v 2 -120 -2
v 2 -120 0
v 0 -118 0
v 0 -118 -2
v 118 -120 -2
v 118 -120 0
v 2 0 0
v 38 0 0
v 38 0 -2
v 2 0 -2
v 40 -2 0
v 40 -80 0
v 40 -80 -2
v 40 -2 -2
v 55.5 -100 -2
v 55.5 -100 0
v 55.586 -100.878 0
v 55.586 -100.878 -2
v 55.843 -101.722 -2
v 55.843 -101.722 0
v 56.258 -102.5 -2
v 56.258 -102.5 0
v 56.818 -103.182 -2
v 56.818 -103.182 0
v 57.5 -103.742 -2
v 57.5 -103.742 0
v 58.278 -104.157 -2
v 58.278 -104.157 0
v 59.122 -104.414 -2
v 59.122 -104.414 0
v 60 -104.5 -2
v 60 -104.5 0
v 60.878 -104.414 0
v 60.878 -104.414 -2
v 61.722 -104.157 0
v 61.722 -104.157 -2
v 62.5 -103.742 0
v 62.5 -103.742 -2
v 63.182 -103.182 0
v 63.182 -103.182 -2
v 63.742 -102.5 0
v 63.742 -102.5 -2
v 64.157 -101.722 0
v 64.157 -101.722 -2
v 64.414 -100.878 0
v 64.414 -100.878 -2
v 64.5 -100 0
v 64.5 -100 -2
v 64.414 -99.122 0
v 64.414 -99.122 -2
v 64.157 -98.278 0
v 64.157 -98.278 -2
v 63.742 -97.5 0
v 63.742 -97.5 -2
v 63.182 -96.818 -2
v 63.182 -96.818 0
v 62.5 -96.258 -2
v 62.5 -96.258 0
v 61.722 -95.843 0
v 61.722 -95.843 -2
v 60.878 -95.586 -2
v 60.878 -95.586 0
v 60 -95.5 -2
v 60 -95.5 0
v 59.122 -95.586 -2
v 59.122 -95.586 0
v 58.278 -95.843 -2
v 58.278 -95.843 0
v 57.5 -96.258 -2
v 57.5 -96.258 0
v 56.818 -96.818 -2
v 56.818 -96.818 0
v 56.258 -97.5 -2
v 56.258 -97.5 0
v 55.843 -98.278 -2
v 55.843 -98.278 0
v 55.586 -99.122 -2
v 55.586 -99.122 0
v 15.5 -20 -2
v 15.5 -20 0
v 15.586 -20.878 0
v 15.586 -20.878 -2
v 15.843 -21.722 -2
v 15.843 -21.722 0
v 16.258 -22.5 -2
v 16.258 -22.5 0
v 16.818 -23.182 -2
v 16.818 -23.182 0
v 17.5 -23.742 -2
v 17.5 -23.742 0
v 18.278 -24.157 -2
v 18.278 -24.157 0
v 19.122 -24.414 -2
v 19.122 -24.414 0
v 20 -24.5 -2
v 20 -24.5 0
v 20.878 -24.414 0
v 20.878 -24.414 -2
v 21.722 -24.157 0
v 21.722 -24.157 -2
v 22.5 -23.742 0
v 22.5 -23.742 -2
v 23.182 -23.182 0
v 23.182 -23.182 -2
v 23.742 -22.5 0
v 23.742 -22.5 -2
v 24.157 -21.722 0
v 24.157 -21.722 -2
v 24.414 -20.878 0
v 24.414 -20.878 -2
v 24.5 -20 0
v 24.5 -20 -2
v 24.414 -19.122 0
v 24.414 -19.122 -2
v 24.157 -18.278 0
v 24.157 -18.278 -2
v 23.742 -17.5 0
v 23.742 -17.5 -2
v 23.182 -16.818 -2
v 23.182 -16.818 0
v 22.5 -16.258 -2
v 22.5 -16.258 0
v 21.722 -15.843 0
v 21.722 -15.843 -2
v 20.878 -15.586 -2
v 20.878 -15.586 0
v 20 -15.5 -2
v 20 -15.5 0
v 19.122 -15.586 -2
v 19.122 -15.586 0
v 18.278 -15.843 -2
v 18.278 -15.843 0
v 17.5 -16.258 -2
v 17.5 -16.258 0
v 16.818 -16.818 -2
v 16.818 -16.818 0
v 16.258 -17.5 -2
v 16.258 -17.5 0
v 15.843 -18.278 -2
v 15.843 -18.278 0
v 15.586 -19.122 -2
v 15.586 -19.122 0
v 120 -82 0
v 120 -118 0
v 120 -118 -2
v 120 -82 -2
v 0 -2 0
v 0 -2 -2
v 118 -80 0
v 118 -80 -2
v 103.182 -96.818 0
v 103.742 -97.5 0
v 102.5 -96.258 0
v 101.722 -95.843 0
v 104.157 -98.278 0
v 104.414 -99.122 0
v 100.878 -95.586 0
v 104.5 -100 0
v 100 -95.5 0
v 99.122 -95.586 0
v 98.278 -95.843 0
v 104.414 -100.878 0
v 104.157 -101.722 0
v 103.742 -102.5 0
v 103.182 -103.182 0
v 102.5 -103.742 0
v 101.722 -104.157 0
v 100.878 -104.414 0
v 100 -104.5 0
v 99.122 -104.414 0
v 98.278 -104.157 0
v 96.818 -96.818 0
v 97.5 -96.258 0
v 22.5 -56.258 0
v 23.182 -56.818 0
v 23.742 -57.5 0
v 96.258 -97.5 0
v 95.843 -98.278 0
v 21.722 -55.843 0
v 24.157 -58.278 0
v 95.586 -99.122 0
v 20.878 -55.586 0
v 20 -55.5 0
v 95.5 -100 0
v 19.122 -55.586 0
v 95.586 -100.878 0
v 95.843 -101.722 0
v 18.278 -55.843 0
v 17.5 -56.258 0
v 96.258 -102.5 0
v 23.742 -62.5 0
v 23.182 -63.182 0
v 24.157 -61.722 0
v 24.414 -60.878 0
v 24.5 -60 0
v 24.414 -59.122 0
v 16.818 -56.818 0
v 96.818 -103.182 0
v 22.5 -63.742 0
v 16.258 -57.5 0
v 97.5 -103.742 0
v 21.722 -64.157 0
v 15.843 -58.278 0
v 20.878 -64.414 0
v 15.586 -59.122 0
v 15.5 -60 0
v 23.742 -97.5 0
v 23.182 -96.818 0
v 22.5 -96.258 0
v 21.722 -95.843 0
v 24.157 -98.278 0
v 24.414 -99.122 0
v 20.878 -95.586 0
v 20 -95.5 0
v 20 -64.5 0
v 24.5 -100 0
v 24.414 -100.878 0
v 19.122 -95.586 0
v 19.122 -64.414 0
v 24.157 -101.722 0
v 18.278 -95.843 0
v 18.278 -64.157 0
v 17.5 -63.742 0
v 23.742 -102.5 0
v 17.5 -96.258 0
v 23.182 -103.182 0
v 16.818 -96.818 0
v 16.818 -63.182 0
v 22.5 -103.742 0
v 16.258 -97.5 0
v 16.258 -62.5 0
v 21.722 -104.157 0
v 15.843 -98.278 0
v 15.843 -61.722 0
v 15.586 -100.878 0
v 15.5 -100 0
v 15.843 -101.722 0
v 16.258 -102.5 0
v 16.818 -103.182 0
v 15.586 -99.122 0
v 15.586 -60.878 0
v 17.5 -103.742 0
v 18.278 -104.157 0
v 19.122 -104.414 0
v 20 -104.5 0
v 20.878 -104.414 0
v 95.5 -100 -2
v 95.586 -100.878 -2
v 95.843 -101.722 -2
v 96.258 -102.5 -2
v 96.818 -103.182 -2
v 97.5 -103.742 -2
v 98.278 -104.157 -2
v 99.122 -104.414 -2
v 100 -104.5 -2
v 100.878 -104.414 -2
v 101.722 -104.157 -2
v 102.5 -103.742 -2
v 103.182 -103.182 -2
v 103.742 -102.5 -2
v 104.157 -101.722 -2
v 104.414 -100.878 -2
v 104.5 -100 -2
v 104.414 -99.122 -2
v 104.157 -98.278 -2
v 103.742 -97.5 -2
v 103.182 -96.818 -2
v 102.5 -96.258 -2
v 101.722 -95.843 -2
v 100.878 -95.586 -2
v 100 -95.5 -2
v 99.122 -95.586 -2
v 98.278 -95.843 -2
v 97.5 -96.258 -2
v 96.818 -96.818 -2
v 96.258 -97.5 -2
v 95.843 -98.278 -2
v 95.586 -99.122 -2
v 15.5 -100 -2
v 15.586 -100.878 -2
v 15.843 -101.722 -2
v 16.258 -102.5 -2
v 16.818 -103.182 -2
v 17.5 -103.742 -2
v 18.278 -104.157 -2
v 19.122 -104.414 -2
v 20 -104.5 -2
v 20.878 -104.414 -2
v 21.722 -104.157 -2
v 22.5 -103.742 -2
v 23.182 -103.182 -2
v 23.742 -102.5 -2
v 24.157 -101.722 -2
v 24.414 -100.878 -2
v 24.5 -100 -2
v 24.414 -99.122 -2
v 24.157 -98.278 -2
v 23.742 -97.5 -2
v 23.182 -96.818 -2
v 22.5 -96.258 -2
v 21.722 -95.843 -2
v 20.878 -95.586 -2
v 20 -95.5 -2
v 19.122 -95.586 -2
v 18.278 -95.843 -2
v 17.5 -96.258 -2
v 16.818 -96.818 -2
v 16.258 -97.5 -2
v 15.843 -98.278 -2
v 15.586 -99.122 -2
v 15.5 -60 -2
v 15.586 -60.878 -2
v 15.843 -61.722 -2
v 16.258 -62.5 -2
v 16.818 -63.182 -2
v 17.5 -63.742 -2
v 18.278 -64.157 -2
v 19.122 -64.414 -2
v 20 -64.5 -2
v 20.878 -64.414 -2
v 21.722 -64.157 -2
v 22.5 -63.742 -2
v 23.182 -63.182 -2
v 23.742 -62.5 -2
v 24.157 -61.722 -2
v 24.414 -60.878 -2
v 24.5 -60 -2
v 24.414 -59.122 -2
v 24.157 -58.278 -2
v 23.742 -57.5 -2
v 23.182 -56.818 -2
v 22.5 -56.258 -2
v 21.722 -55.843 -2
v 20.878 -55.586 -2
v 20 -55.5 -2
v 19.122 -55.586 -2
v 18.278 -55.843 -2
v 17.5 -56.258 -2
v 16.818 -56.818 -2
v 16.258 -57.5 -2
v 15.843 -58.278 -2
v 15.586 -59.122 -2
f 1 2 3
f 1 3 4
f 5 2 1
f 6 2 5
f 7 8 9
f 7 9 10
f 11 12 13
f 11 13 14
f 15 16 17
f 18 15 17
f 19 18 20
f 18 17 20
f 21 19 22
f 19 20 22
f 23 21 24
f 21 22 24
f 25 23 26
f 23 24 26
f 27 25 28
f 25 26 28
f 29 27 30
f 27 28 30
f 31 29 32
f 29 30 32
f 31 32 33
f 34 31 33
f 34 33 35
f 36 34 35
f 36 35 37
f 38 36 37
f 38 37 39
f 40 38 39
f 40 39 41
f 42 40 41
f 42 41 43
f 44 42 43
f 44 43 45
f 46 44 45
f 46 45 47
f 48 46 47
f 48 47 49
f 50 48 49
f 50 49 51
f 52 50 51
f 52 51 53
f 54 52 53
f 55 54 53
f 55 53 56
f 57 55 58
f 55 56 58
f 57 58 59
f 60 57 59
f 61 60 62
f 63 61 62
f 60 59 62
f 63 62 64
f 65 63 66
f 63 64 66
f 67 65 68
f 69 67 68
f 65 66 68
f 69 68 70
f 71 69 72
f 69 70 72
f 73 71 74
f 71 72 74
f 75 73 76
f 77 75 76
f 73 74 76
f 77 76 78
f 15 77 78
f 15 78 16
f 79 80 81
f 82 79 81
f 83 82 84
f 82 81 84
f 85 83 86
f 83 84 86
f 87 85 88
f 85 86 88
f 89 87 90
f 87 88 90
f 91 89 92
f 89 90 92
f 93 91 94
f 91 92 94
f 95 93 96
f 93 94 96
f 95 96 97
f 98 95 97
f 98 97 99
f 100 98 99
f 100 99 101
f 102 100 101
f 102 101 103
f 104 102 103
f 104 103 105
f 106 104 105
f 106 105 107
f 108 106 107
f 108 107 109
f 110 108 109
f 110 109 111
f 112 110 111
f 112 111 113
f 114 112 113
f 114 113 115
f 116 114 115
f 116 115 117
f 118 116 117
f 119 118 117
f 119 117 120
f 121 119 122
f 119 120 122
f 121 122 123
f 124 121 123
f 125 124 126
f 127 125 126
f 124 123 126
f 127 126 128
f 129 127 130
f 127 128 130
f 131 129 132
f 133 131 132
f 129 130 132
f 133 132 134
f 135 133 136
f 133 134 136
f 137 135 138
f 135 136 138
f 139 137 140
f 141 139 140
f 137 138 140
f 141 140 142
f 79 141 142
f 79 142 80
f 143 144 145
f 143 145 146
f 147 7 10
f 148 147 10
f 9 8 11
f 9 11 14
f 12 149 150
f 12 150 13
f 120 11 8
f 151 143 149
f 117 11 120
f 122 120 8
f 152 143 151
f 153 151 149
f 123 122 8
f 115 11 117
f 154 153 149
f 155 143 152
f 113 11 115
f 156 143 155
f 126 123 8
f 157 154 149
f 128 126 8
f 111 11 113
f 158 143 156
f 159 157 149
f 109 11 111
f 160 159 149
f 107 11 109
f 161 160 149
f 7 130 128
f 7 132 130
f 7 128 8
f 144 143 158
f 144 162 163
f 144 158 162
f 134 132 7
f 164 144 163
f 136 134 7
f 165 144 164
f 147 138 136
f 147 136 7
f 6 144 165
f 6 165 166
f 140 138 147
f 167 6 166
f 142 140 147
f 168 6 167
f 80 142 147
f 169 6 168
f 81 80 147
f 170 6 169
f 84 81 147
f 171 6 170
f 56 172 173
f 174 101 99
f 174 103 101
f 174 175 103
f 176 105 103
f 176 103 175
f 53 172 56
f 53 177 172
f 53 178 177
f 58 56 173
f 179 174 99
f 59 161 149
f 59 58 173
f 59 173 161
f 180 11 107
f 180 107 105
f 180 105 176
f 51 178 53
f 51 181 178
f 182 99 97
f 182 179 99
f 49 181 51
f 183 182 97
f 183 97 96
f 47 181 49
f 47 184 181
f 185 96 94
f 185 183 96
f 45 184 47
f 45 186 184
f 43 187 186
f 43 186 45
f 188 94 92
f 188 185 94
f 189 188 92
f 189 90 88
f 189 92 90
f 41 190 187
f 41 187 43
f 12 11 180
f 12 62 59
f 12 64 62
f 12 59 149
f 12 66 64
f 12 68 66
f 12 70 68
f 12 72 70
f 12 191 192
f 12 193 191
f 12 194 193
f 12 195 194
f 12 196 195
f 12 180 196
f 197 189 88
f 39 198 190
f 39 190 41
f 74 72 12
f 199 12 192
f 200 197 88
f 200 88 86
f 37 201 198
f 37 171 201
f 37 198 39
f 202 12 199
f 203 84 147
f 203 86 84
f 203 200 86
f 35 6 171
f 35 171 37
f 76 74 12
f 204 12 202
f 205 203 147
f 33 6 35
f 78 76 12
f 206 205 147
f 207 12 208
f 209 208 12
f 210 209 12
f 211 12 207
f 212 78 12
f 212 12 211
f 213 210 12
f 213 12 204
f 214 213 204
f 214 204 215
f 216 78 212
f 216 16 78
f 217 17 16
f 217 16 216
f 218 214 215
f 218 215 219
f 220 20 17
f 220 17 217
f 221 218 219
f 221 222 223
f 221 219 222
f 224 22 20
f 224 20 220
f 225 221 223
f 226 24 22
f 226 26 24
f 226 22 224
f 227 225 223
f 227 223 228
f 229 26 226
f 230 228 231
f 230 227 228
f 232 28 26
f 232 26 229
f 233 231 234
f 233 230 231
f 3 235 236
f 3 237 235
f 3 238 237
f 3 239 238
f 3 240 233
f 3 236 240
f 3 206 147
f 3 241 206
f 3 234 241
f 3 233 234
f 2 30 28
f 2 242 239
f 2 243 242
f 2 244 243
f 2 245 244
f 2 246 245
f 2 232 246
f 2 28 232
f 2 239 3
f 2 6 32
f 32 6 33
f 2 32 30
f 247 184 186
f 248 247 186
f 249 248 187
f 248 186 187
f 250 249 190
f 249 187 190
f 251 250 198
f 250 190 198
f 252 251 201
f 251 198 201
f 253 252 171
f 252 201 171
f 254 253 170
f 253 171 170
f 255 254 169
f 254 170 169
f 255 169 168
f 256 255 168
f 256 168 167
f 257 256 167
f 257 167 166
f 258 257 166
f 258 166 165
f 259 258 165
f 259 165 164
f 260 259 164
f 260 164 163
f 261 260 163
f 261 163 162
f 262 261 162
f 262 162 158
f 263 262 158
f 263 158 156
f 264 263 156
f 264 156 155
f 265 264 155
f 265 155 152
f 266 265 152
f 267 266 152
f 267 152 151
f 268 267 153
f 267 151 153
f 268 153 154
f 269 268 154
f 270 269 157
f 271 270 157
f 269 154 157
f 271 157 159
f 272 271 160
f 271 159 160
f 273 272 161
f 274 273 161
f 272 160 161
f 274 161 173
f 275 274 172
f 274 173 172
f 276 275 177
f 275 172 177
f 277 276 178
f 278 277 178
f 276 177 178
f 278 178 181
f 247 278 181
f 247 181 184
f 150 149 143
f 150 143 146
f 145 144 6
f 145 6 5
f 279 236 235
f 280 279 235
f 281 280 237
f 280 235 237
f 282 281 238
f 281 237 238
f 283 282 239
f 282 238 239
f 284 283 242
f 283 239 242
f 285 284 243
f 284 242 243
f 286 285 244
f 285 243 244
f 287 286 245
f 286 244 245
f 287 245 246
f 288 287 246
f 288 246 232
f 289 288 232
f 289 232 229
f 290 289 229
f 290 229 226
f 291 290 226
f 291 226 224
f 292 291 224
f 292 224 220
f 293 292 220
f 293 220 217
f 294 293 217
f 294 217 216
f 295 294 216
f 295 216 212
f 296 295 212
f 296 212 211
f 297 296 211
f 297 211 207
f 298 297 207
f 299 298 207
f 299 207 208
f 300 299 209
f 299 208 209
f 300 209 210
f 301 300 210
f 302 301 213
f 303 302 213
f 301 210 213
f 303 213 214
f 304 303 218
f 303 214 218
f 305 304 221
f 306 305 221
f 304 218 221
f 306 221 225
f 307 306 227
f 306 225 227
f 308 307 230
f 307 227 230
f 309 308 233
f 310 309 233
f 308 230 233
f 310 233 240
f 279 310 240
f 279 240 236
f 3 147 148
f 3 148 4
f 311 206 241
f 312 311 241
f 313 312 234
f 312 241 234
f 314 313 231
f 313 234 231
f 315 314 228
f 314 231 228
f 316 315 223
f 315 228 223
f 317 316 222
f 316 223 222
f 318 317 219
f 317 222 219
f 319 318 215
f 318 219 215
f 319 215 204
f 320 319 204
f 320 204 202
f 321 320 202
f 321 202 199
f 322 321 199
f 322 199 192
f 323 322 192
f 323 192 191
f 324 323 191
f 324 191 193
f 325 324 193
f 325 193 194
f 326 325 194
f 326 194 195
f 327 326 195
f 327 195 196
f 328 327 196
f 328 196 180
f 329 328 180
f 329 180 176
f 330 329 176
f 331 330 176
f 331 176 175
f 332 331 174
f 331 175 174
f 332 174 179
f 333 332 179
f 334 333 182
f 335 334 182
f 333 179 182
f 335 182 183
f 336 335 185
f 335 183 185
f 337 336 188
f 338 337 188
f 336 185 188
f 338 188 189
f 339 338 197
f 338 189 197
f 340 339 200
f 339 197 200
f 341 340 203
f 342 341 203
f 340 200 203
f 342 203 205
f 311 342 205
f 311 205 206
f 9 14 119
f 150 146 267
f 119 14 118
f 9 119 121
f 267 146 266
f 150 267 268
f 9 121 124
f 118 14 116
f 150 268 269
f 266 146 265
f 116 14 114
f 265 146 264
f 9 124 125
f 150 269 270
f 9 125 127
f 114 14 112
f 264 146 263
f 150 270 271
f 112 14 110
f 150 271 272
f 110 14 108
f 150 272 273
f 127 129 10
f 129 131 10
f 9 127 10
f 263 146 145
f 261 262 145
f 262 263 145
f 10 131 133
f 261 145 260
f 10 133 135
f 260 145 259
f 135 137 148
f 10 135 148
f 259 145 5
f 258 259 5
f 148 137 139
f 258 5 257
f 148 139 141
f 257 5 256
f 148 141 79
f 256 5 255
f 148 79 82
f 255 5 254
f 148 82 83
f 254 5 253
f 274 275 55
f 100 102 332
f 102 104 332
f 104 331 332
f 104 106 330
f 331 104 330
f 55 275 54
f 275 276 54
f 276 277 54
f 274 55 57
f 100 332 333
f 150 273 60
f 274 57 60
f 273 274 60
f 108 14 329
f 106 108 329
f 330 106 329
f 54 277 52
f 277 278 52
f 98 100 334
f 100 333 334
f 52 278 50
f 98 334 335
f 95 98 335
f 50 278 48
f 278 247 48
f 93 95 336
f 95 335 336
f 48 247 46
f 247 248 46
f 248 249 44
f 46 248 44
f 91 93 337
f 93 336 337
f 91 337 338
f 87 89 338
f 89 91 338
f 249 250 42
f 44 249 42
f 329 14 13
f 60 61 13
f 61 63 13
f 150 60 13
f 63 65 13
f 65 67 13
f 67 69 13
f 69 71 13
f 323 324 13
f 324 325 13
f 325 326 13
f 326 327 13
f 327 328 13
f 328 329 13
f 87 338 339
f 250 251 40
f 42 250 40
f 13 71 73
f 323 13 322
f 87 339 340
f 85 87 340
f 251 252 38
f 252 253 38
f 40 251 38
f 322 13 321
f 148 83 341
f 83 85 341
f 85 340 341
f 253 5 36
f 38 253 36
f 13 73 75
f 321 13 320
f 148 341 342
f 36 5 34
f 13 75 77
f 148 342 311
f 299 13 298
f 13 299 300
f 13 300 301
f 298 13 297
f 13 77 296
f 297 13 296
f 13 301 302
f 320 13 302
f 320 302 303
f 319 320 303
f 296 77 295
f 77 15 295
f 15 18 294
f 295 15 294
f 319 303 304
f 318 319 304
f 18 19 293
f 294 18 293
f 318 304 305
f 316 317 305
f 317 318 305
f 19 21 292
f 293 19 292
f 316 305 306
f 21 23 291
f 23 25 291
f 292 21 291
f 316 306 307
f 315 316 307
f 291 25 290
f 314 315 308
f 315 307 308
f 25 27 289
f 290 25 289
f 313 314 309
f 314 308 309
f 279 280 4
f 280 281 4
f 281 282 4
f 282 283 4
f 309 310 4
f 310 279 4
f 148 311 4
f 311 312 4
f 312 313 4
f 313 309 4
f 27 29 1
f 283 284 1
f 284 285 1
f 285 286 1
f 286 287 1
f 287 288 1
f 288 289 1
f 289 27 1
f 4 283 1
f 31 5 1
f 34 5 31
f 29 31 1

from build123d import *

# Parameters (mm, degrees)
EXTRUDE_1_DEPTH   = 2
HOLE_WIZARD_M81_D = 9
CHAMFER_1_SIZE    = 2


with BuildPart() as part:
    # Эскиз1 → Бобышка-Вытянуть1 (new body)
    with BuildSketch(Plane(origin=(0, 0, 0), x_dir=(1, 0, 0), z_dir=(0, 0, -1))):
        Polygon((0, 0), (0, 120), (120, 120), (120, 80), (40, 80), (40, 0), align=None)
    extrude(amount=EXTRUDE_1_DEPTH)

    # Отверстие с зазором M81 (through all)
    with Locations(Plane(origin=(0, 0, -2), x_dir=(1, 0, 0), z_dir=(0, 0, -1))):
        with Locations((60, 100), (20, 100), (20, 60), (20, 20), (100, 100)):
            Hole(HOLE_WIZARD_M81_D / 2)

    # Фаска1
    chamfer_1_edges = [part.edges().sort_by_distance(p)[0] for p in [
        (0, 0, -1),
        (0, -120, -1),
        (120, -120, -1),
        (120, -80, -1),
        (40, 0, -1),
    ]]
    chamfer(chamfer_1_edges, length=CHAMFER_1_SIZE)


solid = part.part
